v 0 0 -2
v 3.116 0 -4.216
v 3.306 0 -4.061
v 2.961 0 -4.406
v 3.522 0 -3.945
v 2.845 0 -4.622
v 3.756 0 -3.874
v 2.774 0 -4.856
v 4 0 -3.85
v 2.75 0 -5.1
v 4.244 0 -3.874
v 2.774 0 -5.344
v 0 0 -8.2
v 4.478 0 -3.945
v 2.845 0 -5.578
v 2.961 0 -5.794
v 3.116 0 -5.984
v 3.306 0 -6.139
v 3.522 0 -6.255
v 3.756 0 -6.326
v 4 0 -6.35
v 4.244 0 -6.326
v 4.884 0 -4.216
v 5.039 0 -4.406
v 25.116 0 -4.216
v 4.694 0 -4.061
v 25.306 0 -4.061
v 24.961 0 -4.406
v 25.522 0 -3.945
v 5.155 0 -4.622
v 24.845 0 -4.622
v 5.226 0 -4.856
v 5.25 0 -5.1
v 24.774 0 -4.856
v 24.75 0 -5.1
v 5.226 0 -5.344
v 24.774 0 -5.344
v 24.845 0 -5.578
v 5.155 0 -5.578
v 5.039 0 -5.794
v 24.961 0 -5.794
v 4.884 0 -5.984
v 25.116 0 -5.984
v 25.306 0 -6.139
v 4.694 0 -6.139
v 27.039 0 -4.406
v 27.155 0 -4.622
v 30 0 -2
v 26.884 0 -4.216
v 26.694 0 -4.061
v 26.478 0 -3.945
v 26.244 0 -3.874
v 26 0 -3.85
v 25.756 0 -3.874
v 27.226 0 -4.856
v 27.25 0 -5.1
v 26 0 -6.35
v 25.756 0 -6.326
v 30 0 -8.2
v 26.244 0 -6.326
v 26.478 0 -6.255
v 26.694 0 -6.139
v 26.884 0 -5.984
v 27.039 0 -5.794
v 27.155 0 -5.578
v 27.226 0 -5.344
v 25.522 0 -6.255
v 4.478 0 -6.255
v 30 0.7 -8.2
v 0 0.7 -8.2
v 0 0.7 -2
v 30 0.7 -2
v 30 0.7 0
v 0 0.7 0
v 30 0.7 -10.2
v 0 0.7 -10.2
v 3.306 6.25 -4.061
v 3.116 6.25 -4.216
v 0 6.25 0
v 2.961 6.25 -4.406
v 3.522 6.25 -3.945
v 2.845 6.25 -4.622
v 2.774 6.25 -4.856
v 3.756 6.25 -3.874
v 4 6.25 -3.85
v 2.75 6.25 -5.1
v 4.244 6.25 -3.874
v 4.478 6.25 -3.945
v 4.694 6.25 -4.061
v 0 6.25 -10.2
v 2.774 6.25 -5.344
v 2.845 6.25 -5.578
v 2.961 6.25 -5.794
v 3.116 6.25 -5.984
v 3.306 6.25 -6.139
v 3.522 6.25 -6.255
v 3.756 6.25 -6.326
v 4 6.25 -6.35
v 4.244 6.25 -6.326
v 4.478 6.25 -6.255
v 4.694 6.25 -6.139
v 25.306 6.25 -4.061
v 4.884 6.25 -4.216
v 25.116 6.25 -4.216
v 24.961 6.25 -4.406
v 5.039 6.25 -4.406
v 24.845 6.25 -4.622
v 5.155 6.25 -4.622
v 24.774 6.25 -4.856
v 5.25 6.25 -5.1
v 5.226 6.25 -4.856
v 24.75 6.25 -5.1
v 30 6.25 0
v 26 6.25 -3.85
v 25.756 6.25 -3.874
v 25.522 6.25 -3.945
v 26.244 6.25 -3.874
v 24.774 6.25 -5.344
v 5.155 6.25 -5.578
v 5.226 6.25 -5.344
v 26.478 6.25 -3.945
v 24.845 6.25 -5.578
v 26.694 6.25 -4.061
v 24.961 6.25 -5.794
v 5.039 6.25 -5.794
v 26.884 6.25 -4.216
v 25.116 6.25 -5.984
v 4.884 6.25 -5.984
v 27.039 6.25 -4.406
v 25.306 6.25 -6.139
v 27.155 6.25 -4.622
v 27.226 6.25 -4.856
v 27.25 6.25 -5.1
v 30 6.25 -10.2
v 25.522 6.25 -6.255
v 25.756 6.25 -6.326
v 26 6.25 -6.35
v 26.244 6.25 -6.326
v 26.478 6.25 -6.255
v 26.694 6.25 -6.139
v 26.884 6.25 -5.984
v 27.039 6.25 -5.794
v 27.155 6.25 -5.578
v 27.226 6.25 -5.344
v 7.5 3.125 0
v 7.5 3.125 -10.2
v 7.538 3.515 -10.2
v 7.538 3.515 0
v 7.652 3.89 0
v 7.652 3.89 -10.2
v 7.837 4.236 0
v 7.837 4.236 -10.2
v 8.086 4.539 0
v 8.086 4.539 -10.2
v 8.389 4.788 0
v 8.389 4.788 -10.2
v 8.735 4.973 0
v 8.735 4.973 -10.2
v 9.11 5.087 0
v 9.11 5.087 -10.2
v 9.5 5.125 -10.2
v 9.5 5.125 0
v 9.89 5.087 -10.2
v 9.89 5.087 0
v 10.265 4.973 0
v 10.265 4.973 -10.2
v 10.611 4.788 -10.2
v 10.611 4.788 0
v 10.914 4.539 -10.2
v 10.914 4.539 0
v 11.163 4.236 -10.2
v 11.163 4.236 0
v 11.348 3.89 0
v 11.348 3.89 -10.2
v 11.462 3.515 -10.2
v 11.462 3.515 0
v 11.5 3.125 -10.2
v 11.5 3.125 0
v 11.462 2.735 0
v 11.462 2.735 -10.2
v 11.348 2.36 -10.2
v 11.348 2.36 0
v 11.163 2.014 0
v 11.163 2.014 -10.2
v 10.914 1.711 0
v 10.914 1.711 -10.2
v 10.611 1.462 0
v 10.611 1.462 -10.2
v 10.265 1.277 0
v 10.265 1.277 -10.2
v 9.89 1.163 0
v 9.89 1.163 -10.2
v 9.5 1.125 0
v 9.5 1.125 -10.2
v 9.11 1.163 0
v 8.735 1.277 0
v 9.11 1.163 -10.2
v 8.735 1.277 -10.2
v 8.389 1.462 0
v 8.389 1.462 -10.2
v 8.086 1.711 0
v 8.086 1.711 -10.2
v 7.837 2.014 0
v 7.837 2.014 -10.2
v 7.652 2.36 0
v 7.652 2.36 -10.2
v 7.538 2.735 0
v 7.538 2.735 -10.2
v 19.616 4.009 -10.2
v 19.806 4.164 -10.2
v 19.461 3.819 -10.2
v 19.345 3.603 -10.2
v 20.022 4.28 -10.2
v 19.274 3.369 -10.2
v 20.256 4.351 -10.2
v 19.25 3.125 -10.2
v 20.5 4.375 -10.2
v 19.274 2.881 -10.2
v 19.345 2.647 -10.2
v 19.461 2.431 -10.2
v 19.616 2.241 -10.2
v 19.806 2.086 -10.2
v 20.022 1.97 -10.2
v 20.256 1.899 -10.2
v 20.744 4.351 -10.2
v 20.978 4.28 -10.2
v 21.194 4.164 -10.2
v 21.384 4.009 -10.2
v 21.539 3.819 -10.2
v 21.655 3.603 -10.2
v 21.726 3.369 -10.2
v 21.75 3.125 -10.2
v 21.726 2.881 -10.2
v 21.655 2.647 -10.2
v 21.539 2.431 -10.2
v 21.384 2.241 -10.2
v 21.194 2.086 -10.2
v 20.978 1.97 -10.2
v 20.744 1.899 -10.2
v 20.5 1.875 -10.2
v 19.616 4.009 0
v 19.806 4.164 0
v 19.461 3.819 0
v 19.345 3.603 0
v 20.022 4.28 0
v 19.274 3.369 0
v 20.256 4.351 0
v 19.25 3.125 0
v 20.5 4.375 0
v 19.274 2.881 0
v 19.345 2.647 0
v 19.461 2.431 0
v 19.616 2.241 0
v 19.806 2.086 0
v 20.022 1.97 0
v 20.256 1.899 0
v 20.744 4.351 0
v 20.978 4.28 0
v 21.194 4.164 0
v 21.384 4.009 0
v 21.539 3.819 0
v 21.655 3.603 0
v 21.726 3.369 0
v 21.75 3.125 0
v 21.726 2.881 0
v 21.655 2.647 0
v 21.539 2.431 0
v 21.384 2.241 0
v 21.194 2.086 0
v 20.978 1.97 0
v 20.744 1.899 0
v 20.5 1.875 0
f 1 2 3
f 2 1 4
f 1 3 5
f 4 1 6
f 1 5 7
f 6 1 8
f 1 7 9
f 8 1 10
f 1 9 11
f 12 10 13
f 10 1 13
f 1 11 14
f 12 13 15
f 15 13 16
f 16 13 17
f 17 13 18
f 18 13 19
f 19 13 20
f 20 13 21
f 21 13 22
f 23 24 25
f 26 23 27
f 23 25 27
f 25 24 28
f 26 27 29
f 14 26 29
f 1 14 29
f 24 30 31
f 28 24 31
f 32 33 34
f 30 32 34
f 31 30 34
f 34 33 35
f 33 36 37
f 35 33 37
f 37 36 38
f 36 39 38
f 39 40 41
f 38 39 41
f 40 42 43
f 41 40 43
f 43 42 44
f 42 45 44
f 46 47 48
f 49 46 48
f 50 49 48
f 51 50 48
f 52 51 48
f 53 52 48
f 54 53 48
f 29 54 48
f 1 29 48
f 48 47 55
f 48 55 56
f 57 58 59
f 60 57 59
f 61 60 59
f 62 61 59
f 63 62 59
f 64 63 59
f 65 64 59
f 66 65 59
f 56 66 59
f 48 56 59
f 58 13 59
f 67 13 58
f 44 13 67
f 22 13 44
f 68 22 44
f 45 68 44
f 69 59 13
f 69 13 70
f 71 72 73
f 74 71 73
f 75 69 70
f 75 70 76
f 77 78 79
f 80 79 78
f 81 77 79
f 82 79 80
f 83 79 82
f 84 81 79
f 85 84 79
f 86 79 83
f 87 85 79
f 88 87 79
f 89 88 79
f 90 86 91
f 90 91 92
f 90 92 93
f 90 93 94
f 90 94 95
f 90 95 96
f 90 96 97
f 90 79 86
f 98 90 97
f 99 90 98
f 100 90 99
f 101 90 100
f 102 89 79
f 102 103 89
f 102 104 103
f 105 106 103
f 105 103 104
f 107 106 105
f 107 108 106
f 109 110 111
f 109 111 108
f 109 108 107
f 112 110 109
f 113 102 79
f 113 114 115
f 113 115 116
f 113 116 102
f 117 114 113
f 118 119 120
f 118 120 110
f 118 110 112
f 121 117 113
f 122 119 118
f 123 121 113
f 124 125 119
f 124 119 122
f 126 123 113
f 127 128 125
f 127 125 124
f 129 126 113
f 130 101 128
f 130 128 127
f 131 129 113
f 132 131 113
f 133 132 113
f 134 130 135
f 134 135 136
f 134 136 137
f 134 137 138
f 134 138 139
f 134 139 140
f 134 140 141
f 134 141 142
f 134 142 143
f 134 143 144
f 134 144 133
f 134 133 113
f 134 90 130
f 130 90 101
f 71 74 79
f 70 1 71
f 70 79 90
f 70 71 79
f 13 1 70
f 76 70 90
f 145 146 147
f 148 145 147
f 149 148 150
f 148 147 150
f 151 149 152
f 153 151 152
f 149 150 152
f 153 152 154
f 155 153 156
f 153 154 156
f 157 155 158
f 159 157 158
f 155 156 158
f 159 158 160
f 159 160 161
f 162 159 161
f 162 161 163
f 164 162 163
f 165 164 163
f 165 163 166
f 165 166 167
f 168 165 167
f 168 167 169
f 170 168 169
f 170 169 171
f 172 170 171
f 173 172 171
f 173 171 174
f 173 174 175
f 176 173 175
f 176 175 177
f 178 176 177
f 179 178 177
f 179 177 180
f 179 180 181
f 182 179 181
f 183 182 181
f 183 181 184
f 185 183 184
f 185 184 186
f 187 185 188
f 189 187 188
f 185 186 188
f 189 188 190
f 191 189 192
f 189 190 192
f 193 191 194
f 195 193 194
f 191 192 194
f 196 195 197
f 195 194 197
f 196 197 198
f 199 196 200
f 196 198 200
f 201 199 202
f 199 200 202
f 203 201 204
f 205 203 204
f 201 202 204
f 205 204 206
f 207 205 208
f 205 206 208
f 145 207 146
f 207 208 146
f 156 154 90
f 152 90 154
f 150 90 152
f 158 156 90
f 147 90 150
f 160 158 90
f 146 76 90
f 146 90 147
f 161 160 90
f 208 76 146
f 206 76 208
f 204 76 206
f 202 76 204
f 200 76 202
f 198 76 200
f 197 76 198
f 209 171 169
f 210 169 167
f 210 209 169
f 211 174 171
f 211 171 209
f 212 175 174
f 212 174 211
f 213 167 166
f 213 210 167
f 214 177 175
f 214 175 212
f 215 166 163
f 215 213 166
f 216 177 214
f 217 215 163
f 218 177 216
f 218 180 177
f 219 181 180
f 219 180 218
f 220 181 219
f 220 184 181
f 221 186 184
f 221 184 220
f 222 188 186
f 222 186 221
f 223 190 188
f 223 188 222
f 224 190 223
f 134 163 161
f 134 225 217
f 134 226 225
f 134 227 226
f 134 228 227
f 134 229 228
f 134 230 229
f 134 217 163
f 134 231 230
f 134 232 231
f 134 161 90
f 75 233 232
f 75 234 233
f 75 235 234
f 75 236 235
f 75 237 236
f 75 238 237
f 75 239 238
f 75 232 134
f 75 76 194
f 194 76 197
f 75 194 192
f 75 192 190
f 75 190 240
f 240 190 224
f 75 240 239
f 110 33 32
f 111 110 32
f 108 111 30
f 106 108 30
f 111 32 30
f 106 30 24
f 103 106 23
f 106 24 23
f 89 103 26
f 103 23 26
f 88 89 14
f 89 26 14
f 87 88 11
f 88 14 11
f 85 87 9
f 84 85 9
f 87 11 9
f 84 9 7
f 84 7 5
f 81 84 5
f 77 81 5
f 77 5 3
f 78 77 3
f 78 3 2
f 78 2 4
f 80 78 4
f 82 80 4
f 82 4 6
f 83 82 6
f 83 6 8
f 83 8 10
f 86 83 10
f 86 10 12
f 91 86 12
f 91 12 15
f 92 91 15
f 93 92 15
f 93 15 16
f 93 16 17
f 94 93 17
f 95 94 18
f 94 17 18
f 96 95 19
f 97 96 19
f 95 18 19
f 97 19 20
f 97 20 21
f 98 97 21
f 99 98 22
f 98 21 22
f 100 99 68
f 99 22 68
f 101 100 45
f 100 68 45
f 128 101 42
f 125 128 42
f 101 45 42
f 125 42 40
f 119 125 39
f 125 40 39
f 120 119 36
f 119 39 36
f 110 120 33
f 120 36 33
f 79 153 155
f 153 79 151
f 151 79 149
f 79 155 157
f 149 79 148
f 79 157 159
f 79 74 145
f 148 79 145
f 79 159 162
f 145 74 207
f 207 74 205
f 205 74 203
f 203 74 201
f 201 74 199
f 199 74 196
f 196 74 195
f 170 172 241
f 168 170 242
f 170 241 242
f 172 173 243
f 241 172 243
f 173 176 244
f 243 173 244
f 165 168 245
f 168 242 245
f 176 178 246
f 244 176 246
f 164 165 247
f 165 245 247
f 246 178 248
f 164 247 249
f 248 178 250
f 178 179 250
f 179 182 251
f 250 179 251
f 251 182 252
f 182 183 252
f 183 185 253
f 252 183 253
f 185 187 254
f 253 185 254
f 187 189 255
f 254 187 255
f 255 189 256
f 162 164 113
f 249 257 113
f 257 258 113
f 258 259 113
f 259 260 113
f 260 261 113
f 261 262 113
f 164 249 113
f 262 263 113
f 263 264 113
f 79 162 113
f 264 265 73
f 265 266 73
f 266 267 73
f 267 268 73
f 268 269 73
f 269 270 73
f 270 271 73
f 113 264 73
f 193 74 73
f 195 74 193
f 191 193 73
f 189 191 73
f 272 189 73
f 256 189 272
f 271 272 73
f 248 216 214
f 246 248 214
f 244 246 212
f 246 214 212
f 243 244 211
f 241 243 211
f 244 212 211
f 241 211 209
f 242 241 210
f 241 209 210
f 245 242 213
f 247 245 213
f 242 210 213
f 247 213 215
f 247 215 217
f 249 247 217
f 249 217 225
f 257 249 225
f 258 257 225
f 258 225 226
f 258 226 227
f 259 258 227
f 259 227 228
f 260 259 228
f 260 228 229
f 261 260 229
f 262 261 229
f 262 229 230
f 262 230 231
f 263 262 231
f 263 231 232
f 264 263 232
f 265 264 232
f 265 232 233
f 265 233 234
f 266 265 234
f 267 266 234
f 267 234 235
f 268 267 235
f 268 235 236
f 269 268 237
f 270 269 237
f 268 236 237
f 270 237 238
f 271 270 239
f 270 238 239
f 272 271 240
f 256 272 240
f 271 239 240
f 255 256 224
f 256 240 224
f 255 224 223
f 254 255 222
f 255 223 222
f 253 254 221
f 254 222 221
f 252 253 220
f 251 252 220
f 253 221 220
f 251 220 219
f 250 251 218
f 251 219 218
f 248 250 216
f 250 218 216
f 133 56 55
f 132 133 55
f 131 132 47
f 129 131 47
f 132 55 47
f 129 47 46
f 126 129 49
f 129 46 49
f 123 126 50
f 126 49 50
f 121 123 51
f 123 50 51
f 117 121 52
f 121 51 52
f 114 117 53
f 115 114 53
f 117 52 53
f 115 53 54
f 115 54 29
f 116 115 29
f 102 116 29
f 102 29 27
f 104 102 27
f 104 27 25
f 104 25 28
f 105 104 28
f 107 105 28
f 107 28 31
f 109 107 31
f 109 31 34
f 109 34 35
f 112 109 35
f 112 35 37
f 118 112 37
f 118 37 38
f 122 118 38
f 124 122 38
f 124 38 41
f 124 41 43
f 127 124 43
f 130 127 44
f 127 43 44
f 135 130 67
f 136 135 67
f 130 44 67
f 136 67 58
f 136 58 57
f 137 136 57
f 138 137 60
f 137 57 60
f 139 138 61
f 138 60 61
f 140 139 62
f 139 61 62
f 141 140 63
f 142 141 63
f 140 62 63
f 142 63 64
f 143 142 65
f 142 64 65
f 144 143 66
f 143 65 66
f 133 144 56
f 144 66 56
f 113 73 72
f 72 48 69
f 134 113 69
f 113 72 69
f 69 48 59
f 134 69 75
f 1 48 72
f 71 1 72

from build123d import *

# Parameters (mm, degrees)
SKETCH1_W                  = 30
SKETCH1_H                  = 10.2
BOSS_EXTRUDE1_DEPTH        = 6.25
F_4_0_4_DIAMETER_HOLE1_D   = 4
F_2_5_2_5_DIAMETER_HOLE2_D = 2.5
F_2_5_2_5_DIAMETER_HOLE1_D = 2.5
SKETCH6_W                  = 2
SKETCH6_H                  = 0.7
CUT_EXTRUDE1_DEPTH         = 31


with BuildPart() as part:
    # Sketch1 → Boss-Extrude1 (new body)
    with BuildSketch(Plane(origin=(0, 0, 0), x_dir=(1, 0, 0), z_dir=(0, 1, 0))):
        with Locations((15, 5.1)):
            Rectangle(SKETCH1_W, SKETCH1_H)
    extrude(amount=BOSS_EXTRUDE1_DEPTH)

    # Ø4.0 (4) Diameter Hole1 (through all)
    with Locations(Plane.XY):
        with Locations((9.5, 3.125)):
            Hole(F_4_0_4_DIAMETER_HOLE1_D / 2)

    # Ø2.5 (2.5) Diameter Hole2 (through all)
    with Locations(Plane.XY):
        with Locations((20.5, 3.125)):
            Hole(F_2_5_2_5_DIAMETER_HOLE2_D / 2)

    # Ø2.5 (2.5) Diameter Hole1 (through all)
    with Locations(Plane(origin=(0, 6.25, 0), x_dir=(-1, 0, 0), z_dir=(0, 1, 0))):
        with Locations((-4, -5.1), (-26, -5.1)):
            Hole(F_2_5_2_5_DIAMETER_HOLE1_D / 2)

    # Sketch6 → Cut-Extrude1 (cut, through all)
    with BuildSketch(Plane(origin=(30, 0, 0), x_dir=(0, 0, -1), z_dir=(1, 0, 0))):
        with Locations((9.2, 0.35)):
            Rectangle(SKETCH6_W, SKETCH6_H)
    cut_extrude1 = extrude(amount=-CUT_EXTRUDE1_DEPTH, mode=Mode.SUBTRACT)

    # Mirror1: Cut-Extrude1 across plane
    add(cut_extrude1.mirror(Plane.XY.offset(-5.1)), mode=Mode.SUBTRACT)


solid = part.part
